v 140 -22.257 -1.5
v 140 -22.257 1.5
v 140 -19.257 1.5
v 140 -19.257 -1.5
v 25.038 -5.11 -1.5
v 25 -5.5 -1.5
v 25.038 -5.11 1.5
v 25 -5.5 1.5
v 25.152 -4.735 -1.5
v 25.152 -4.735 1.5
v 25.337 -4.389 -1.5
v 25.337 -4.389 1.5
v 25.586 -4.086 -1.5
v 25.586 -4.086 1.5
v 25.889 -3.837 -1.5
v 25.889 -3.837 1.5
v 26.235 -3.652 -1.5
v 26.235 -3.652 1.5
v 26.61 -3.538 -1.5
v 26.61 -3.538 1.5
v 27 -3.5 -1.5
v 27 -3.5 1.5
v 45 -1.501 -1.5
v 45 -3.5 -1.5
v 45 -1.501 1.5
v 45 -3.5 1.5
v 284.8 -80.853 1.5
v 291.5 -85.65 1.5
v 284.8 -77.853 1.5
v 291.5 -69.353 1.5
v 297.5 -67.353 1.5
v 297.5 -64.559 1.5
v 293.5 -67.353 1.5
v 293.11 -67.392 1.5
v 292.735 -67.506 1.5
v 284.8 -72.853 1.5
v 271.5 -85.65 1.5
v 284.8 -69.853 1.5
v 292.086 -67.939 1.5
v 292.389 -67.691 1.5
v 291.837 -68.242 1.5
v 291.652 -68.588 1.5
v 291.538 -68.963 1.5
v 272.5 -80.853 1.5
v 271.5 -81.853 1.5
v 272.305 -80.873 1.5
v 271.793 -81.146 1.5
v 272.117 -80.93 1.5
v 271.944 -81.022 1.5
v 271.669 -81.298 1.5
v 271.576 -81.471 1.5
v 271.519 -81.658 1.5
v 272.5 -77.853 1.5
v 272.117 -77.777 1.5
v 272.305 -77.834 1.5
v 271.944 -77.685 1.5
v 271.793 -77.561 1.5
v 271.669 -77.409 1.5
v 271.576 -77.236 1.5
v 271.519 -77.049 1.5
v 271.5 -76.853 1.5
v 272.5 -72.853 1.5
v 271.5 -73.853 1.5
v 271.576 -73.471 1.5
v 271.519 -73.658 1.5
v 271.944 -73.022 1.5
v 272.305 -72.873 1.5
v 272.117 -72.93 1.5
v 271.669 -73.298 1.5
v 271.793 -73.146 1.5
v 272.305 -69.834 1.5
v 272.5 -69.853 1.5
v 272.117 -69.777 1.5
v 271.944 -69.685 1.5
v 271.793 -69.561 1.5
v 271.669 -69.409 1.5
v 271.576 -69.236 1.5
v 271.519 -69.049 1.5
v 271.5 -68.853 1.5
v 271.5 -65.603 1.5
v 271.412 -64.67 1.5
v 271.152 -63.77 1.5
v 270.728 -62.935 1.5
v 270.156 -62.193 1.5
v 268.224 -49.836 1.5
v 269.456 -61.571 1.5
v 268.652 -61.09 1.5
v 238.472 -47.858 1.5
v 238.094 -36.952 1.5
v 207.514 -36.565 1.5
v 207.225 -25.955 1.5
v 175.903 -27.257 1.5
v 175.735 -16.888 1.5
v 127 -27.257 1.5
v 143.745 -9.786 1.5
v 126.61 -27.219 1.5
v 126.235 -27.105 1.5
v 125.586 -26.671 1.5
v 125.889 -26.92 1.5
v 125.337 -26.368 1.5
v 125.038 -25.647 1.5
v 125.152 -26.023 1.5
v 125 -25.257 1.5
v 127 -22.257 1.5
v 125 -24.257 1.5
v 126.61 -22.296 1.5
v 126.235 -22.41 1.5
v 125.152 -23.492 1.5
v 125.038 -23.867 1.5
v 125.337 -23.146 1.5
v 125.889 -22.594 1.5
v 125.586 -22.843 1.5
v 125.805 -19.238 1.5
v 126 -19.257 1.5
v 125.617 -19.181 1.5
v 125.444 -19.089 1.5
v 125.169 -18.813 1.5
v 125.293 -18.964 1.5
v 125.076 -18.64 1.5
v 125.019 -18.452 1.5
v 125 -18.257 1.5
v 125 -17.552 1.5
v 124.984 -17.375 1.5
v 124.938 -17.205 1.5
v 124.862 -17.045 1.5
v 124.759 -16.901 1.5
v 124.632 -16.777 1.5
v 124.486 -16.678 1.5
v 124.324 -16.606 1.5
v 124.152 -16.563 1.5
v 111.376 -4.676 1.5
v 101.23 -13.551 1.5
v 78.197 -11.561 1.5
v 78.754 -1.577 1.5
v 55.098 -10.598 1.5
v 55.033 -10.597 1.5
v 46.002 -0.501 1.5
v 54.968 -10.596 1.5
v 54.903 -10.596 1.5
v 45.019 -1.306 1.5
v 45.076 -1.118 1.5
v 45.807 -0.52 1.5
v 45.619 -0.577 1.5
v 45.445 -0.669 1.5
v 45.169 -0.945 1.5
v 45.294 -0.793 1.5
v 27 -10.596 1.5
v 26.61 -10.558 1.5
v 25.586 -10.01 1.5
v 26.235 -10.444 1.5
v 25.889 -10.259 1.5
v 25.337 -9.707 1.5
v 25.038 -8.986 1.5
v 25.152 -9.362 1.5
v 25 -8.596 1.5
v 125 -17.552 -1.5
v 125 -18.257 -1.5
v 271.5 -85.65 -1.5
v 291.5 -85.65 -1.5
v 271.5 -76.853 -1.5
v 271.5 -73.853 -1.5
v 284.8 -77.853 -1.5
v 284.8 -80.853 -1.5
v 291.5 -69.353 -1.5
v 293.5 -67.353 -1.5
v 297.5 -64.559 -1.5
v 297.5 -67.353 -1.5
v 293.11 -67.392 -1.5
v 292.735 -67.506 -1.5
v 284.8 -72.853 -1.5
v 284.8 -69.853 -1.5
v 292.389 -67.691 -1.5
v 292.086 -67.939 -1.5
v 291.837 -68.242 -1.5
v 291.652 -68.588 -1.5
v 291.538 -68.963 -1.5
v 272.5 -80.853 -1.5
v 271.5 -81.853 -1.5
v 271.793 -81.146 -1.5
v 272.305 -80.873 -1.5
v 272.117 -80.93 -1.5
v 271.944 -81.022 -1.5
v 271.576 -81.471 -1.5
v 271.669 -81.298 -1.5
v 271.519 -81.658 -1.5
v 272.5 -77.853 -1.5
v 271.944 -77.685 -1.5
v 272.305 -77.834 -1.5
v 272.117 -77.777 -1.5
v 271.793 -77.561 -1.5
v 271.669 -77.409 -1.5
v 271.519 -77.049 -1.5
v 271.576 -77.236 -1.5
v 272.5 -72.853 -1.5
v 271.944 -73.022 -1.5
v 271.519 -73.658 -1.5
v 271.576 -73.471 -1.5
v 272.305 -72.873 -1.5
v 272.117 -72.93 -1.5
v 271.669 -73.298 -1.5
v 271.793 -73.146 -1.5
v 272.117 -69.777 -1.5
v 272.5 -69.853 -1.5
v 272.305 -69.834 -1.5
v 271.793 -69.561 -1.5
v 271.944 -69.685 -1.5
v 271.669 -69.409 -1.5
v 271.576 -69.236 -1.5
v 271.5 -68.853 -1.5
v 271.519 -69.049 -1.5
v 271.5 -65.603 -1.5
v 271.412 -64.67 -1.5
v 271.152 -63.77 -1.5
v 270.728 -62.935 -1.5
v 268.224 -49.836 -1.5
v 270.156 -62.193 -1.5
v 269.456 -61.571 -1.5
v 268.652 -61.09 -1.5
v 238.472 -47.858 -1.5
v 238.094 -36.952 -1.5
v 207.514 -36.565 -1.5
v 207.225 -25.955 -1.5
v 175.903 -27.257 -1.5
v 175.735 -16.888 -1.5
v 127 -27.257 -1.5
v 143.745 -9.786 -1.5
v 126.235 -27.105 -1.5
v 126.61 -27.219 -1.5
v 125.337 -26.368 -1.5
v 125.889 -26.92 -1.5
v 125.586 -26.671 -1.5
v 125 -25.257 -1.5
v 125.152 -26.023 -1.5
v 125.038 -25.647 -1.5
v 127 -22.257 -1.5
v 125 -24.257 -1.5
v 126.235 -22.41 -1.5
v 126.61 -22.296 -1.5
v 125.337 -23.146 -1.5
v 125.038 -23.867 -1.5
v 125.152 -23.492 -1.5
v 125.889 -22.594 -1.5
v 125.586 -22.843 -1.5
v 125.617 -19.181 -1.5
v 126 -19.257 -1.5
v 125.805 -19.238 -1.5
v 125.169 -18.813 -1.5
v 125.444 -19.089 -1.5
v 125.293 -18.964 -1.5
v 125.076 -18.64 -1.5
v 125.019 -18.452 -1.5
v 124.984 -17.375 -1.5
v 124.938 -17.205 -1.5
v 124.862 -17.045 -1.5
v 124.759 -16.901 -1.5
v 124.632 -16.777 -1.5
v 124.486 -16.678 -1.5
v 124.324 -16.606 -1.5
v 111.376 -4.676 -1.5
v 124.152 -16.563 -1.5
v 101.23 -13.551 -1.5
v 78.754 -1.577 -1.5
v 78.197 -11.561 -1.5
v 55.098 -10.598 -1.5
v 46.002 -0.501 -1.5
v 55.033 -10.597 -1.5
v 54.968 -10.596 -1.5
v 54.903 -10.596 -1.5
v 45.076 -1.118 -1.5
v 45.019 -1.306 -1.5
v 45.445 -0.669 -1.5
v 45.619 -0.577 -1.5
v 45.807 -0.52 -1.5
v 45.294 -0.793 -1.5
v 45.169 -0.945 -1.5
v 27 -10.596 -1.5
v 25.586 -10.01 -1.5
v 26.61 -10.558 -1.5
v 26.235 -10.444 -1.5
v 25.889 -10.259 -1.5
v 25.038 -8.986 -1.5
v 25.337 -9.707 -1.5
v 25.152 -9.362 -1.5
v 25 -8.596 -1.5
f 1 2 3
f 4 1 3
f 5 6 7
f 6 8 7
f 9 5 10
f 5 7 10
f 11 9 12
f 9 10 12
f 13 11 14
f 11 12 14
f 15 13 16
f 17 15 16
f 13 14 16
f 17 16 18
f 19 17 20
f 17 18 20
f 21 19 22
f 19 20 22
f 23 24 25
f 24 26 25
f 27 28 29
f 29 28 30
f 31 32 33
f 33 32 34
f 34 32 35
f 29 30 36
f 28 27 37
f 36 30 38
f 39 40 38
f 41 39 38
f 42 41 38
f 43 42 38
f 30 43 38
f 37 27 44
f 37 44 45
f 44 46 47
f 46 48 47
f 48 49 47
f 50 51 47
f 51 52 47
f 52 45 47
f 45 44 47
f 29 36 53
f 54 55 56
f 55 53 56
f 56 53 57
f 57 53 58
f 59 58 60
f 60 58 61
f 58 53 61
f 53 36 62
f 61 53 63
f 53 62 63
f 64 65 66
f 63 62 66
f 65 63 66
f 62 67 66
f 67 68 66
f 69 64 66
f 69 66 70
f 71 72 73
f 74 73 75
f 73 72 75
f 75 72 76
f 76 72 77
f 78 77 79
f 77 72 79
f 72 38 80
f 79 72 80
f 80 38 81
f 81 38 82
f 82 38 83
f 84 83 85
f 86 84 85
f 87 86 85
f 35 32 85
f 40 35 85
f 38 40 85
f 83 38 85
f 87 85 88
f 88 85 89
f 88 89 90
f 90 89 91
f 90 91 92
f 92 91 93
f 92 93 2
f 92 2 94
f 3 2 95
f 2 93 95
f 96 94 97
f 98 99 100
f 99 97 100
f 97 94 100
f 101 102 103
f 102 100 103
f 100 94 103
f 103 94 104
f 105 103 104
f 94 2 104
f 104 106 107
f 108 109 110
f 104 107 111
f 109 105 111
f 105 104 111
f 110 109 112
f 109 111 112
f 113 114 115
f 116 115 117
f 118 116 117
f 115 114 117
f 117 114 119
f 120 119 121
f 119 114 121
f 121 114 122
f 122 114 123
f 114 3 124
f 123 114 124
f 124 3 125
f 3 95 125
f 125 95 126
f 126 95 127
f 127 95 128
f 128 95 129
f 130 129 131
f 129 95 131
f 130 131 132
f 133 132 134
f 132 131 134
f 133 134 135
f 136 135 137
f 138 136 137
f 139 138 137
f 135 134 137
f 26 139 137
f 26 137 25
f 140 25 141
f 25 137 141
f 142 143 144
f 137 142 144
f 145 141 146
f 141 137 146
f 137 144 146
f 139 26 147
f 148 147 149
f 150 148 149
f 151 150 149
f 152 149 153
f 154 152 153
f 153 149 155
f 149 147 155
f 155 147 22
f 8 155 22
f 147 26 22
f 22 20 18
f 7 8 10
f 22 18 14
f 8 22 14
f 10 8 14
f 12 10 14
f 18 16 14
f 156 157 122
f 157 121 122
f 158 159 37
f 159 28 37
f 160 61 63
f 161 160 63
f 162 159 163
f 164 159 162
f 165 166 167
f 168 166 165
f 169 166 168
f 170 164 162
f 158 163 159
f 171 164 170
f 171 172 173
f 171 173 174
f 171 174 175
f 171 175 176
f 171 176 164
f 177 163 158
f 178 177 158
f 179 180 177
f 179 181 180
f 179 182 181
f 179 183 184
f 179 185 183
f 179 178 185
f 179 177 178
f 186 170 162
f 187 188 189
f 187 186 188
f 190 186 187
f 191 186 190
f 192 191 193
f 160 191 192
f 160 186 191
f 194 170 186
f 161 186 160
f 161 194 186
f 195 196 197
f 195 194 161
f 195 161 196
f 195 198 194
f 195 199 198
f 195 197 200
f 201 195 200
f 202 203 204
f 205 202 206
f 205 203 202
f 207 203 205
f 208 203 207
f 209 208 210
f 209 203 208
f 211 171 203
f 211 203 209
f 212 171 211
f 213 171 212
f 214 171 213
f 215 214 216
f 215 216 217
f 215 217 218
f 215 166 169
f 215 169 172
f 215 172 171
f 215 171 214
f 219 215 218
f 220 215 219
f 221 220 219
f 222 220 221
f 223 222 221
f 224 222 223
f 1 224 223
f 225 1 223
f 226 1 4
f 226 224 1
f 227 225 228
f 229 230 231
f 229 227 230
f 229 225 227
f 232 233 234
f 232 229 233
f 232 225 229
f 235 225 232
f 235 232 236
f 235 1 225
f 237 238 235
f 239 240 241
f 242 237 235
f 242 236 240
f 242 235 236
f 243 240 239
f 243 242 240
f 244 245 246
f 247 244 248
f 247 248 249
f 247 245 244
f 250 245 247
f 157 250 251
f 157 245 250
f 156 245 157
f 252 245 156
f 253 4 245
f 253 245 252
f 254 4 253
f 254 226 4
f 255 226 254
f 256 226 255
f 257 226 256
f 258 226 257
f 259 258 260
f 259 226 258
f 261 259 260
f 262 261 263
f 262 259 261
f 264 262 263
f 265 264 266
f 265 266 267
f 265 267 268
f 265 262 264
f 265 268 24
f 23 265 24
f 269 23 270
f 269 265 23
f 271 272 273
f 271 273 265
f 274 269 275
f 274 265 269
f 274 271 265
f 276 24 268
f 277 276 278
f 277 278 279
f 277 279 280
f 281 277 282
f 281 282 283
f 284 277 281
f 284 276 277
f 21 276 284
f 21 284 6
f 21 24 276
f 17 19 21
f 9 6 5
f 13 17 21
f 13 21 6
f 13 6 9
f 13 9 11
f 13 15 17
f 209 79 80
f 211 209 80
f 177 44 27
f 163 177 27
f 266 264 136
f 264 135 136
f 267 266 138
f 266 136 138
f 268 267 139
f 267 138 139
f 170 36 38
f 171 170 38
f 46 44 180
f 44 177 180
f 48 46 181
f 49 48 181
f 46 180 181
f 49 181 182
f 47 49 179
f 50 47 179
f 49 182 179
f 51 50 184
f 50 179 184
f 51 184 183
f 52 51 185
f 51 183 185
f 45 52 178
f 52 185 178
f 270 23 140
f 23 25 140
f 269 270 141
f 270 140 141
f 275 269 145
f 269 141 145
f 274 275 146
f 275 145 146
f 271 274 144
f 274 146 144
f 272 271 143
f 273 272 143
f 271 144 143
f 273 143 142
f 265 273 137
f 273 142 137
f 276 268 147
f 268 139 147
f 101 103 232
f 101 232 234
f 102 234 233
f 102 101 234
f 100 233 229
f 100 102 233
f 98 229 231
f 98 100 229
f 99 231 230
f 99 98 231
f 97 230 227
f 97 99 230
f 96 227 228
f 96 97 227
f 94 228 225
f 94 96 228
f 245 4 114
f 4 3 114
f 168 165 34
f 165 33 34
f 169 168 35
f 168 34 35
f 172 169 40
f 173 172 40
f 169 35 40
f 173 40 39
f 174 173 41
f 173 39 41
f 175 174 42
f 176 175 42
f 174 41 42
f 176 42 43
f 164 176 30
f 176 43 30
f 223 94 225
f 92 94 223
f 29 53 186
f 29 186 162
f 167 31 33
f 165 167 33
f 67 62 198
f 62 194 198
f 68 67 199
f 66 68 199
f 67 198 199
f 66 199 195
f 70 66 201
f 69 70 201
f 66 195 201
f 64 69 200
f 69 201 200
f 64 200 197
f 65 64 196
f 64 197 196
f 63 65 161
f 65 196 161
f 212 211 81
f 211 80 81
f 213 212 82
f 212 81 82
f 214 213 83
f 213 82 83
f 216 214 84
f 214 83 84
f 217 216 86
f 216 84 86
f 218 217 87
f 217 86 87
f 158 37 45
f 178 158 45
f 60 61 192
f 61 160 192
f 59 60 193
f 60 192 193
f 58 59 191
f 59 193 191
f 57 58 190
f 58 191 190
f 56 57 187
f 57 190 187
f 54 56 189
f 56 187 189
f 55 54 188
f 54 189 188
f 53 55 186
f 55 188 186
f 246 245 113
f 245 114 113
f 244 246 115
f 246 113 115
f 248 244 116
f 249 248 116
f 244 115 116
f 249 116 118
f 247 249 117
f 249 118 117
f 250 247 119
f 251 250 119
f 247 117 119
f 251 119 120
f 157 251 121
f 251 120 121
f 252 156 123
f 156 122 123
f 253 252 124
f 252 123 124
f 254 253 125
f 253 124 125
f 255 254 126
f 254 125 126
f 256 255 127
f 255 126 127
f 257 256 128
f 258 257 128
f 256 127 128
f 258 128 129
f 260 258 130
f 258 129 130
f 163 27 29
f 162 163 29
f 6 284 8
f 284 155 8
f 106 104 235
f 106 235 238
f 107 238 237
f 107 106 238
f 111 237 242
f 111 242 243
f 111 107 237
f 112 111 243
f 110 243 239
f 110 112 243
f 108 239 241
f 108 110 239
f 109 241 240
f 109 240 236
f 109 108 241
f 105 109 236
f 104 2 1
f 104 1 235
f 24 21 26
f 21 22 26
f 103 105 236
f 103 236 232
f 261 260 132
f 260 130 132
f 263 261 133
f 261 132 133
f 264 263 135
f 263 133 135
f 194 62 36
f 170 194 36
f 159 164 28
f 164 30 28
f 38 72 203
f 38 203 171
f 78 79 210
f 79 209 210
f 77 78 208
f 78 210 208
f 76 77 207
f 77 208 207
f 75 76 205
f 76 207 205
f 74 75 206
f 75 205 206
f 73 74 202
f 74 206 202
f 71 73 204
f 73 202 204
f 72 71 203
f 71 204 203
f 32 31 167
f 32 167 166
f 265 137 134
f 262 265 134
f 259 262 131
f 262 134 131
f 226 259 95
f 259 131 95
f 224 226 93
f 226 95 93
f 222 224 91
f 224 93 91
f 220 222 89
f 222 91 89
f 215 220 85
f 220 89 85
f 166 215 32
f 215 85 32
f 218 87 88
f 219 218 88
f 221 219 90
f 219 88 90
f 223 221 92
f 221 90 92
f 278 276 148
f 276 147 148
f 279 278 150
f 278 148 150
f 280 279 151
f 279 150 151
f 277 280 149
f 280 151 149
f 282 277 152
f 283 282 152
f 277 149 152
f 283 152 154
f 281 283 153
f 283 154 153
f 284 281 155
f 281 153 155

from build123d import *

# Parameters (mm, degrees)
BOSS_EXTRUDE1_DEPTH = 1.5
SKETCH3_W           = 13.3
SKETCH3_H           = 3
CUT_EXTRUDE1_DEPTH  = 10
FILLET1_R           = 1
SKETCH4_W           = 2
SKETCH4_H           = 7.019019915
CUT_EXTRUDE2_DEPTH  = 10
BOSS_EXTRUDE2_DEPTH = 3


with BuildPart() as part:
    # Sketch2 → Boss-Extrude1 (new, symmetric)
    with BuildSketch(Plane.XY):
        with BuildLine():
            Line((299.5, -67.353443934), (293.5, -67.353443934))
            ThreePointArc((293.5, -67.353443934), (292.085786438, -67.939230372), (291.5, -69.353443934))
            Line((291.5, -69.353443934), (291.5, -85.649534053))
            Line((291.5, -85.649534053), (271.5, -85.649534053))
            Line((271.5, -85.649534053), (271.5, -65.603161932))
            ThreePointArc((271.5, -65.603161932), (270.728442335, -62.934777511), (268.651889832, -61.089918071))
            ThreePointArc((268.651889832, -61.089918071), (217.204334173, -39.861711653), (163.781589842, -24.257285386))
            Line((163.781589842, -24.257285386), (141, -24.257285386))
            ThreePointArc((141, -24.257285386), (140.292893219, -23.964392167), (140, -23.257285386))
            Line((140, -23.257285386), (140, -19.257285386))
            Line((140, -19.257285386), (126, -19.257285386))
            ThreePointArc((126, -19.257285386), (125.292893219, -18.964392167), (125, -18.257285386))
            Line((125, -18.257285386), (125, -17.551725847))
            ThreePointArc((125, -17.551725847), (124.759050209, -16.900693759), (124.152314439, -16.563393762))
            ThreePointArc((124.152314439, -16.563393762), (89.724531973, -12.428170907), (55.097618142, -10.598112953))
            ThreePointArc((55.097618142, -10.598112953), (55.000467449, -10.596696958), (54.903307584, -10.596224945))
            Line((54.903307584, -10.596224945), (27, -10.596224945))
            ThreePointArc((27, -10.596224945), (25.585786438, -10.010438507), (25, -8.596224945))
            Line((25, -8.596224945), (25, -5.5))
            ThreePointArc((25, -5.5), (25.585786438, -4.085786438), (27, -3.5))
            Line((27, -3.5), (45, -3.5))
            Line((45, -3.5), (45, -1.500945781))
            ThreePointArc((45, -1.500945781), (45.293562303, -0.793170548), (46.001891561, -0.50094757))
            ThreePointArc((46.001891561, -0.50094757), (176.838494864, -17.170276226), (299.5, -65.649534053))
            Line((299.5, -65.649534053), (299.5, -67.353443934))
        make_face()
    extrude(amount=BOSS_EXTRUDE1_DEPTH, both=True)

    # Sketch3 → Cut-Extrude1 (cut)
    with BuildSketch(Plane.XY.offset(1.5)):
        with Locations((278.15, -71.353443934)):
            Rectangle(SKETCH3_W, SKETCH3_H)
        with Locations((278.15, -79.353443934)):
            Rectangle(SKETCH3_W, SKETCH3_H)
    extrude(amount=-CUT_EXTRUDE1_DEPTH, mode=Mode.SUBTRACT)

    # Fillet1
    fillet1_edges = [part.edges().sort_by_distance(p)[0] for p in [
        (271.5, -72.853443934, 0),
        (271.5, -69.853443934, 0),
        (271.5, -80.853443934, 0),
        (271.5, -77.853443934, 0),
    ]]
    fillet(fillet1_edges, radius=FILLET1_R)

    # Sketch4 → Cut-Extrude2 (cut)
    with BuildSketch(Plane.XY.offset(1.5)):
        with Locations((298.5, -66.105228371)):
            Rectangle(SKETCH4_W, SKETCH4_H)
    extrude(amount=-CUT_EXTRUDE2_DEPTH, mode=Mode.SUBTRACT)

    # Sketch5 → Boss-Extrude2 (add)
    with BuildSketch(Plane.XY.offset(1.5)):
        with BuildLine():
            Line((140, -19.257285386), (140, -22.257285386))
            Line((140, -22.257285386), (127, -22.257285386))
            ThreePointArc((127, -22.257285386), (125.585786438, -22.843071823), (125, -24.257285386))
            Line((125, -24.257285386), (125, -25.257285386))
            ThreePointArc((125, -25.257285386), (125.585786438, -26.671498948), (127, -27.257285386))
            Line((127, -27.257285386), (175.902657485, -27.257285386))
            Line((175.902657485, -27.257285386), (184.756236065, -23.311413726))
            Line((184.756236065, -23.311413726), (140, -19.257285386))
        make_face()
    extrude(amount=-BOSS_EXTRUDE2_DEPTH)


solid = part.part
